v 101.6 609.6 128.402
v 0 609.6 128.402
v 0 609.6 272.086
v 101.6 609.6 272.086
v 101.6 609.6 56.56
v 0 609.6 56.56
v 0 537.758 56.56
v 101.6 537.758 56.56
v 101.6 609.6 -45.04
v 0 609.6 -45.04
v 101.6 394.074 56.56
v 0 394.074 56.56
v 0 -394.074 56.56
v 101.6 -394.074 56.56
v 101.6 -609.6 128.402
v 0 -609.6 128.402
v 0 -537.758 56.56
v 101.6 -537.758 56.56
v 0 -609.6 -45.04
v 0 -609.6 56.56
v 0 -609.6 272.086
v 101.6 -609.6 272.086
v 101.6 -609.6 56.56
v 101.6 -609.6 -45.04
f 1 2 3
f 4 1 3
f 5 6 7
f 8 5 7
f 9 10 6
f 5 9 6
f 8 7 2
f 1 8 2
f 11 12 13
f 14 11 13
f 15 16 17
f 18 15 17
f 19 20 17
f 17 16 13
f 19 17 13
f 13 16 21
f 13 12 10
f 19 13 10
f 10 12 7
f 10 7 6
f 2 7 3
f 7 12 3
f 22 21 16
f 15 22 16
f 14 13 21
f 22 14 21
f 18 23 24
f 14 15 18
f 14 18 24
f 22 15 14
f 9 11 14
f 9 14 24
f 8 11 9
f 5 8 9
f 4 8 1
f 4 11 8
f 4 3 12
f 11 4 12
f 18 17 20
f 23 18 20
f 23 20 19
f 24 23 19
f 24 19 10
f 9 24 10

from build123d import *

# Parameters (mm, degrees)
F1_DEPTH = 101.6


with BuildPart() as f1:
    # F0 (on Right) → F1 (new body)
    with BuildSketch(Plane.YZ):
        Polygon((-609.6, 128.40195), (-537.757951, 56.559901), (-394.073853, 56.559901), (-609.6, 272.086048), align=None)
        Polygon((-537.757951, 56.559901), (-609.6, 56.559901), (-609.6, -45.040099), (0, -45.040099), (0, 56.559901), (-394.073853, 56.559901), align=None)
        Polygon((609.6, 272.086048), (394.073853, 56.559901), (537.757951, 56.559901), (609.6, 128.40195), align=None)
        Polygon((0, 56.559901), (0, -45.040099), (609.6, -45.040099), (609.6, 56.559901), (537.757951, 56.559901), (394.073853, 56.559901), align=None)
    extrude(amount=F1_DEPTH)


solid = f1.part
